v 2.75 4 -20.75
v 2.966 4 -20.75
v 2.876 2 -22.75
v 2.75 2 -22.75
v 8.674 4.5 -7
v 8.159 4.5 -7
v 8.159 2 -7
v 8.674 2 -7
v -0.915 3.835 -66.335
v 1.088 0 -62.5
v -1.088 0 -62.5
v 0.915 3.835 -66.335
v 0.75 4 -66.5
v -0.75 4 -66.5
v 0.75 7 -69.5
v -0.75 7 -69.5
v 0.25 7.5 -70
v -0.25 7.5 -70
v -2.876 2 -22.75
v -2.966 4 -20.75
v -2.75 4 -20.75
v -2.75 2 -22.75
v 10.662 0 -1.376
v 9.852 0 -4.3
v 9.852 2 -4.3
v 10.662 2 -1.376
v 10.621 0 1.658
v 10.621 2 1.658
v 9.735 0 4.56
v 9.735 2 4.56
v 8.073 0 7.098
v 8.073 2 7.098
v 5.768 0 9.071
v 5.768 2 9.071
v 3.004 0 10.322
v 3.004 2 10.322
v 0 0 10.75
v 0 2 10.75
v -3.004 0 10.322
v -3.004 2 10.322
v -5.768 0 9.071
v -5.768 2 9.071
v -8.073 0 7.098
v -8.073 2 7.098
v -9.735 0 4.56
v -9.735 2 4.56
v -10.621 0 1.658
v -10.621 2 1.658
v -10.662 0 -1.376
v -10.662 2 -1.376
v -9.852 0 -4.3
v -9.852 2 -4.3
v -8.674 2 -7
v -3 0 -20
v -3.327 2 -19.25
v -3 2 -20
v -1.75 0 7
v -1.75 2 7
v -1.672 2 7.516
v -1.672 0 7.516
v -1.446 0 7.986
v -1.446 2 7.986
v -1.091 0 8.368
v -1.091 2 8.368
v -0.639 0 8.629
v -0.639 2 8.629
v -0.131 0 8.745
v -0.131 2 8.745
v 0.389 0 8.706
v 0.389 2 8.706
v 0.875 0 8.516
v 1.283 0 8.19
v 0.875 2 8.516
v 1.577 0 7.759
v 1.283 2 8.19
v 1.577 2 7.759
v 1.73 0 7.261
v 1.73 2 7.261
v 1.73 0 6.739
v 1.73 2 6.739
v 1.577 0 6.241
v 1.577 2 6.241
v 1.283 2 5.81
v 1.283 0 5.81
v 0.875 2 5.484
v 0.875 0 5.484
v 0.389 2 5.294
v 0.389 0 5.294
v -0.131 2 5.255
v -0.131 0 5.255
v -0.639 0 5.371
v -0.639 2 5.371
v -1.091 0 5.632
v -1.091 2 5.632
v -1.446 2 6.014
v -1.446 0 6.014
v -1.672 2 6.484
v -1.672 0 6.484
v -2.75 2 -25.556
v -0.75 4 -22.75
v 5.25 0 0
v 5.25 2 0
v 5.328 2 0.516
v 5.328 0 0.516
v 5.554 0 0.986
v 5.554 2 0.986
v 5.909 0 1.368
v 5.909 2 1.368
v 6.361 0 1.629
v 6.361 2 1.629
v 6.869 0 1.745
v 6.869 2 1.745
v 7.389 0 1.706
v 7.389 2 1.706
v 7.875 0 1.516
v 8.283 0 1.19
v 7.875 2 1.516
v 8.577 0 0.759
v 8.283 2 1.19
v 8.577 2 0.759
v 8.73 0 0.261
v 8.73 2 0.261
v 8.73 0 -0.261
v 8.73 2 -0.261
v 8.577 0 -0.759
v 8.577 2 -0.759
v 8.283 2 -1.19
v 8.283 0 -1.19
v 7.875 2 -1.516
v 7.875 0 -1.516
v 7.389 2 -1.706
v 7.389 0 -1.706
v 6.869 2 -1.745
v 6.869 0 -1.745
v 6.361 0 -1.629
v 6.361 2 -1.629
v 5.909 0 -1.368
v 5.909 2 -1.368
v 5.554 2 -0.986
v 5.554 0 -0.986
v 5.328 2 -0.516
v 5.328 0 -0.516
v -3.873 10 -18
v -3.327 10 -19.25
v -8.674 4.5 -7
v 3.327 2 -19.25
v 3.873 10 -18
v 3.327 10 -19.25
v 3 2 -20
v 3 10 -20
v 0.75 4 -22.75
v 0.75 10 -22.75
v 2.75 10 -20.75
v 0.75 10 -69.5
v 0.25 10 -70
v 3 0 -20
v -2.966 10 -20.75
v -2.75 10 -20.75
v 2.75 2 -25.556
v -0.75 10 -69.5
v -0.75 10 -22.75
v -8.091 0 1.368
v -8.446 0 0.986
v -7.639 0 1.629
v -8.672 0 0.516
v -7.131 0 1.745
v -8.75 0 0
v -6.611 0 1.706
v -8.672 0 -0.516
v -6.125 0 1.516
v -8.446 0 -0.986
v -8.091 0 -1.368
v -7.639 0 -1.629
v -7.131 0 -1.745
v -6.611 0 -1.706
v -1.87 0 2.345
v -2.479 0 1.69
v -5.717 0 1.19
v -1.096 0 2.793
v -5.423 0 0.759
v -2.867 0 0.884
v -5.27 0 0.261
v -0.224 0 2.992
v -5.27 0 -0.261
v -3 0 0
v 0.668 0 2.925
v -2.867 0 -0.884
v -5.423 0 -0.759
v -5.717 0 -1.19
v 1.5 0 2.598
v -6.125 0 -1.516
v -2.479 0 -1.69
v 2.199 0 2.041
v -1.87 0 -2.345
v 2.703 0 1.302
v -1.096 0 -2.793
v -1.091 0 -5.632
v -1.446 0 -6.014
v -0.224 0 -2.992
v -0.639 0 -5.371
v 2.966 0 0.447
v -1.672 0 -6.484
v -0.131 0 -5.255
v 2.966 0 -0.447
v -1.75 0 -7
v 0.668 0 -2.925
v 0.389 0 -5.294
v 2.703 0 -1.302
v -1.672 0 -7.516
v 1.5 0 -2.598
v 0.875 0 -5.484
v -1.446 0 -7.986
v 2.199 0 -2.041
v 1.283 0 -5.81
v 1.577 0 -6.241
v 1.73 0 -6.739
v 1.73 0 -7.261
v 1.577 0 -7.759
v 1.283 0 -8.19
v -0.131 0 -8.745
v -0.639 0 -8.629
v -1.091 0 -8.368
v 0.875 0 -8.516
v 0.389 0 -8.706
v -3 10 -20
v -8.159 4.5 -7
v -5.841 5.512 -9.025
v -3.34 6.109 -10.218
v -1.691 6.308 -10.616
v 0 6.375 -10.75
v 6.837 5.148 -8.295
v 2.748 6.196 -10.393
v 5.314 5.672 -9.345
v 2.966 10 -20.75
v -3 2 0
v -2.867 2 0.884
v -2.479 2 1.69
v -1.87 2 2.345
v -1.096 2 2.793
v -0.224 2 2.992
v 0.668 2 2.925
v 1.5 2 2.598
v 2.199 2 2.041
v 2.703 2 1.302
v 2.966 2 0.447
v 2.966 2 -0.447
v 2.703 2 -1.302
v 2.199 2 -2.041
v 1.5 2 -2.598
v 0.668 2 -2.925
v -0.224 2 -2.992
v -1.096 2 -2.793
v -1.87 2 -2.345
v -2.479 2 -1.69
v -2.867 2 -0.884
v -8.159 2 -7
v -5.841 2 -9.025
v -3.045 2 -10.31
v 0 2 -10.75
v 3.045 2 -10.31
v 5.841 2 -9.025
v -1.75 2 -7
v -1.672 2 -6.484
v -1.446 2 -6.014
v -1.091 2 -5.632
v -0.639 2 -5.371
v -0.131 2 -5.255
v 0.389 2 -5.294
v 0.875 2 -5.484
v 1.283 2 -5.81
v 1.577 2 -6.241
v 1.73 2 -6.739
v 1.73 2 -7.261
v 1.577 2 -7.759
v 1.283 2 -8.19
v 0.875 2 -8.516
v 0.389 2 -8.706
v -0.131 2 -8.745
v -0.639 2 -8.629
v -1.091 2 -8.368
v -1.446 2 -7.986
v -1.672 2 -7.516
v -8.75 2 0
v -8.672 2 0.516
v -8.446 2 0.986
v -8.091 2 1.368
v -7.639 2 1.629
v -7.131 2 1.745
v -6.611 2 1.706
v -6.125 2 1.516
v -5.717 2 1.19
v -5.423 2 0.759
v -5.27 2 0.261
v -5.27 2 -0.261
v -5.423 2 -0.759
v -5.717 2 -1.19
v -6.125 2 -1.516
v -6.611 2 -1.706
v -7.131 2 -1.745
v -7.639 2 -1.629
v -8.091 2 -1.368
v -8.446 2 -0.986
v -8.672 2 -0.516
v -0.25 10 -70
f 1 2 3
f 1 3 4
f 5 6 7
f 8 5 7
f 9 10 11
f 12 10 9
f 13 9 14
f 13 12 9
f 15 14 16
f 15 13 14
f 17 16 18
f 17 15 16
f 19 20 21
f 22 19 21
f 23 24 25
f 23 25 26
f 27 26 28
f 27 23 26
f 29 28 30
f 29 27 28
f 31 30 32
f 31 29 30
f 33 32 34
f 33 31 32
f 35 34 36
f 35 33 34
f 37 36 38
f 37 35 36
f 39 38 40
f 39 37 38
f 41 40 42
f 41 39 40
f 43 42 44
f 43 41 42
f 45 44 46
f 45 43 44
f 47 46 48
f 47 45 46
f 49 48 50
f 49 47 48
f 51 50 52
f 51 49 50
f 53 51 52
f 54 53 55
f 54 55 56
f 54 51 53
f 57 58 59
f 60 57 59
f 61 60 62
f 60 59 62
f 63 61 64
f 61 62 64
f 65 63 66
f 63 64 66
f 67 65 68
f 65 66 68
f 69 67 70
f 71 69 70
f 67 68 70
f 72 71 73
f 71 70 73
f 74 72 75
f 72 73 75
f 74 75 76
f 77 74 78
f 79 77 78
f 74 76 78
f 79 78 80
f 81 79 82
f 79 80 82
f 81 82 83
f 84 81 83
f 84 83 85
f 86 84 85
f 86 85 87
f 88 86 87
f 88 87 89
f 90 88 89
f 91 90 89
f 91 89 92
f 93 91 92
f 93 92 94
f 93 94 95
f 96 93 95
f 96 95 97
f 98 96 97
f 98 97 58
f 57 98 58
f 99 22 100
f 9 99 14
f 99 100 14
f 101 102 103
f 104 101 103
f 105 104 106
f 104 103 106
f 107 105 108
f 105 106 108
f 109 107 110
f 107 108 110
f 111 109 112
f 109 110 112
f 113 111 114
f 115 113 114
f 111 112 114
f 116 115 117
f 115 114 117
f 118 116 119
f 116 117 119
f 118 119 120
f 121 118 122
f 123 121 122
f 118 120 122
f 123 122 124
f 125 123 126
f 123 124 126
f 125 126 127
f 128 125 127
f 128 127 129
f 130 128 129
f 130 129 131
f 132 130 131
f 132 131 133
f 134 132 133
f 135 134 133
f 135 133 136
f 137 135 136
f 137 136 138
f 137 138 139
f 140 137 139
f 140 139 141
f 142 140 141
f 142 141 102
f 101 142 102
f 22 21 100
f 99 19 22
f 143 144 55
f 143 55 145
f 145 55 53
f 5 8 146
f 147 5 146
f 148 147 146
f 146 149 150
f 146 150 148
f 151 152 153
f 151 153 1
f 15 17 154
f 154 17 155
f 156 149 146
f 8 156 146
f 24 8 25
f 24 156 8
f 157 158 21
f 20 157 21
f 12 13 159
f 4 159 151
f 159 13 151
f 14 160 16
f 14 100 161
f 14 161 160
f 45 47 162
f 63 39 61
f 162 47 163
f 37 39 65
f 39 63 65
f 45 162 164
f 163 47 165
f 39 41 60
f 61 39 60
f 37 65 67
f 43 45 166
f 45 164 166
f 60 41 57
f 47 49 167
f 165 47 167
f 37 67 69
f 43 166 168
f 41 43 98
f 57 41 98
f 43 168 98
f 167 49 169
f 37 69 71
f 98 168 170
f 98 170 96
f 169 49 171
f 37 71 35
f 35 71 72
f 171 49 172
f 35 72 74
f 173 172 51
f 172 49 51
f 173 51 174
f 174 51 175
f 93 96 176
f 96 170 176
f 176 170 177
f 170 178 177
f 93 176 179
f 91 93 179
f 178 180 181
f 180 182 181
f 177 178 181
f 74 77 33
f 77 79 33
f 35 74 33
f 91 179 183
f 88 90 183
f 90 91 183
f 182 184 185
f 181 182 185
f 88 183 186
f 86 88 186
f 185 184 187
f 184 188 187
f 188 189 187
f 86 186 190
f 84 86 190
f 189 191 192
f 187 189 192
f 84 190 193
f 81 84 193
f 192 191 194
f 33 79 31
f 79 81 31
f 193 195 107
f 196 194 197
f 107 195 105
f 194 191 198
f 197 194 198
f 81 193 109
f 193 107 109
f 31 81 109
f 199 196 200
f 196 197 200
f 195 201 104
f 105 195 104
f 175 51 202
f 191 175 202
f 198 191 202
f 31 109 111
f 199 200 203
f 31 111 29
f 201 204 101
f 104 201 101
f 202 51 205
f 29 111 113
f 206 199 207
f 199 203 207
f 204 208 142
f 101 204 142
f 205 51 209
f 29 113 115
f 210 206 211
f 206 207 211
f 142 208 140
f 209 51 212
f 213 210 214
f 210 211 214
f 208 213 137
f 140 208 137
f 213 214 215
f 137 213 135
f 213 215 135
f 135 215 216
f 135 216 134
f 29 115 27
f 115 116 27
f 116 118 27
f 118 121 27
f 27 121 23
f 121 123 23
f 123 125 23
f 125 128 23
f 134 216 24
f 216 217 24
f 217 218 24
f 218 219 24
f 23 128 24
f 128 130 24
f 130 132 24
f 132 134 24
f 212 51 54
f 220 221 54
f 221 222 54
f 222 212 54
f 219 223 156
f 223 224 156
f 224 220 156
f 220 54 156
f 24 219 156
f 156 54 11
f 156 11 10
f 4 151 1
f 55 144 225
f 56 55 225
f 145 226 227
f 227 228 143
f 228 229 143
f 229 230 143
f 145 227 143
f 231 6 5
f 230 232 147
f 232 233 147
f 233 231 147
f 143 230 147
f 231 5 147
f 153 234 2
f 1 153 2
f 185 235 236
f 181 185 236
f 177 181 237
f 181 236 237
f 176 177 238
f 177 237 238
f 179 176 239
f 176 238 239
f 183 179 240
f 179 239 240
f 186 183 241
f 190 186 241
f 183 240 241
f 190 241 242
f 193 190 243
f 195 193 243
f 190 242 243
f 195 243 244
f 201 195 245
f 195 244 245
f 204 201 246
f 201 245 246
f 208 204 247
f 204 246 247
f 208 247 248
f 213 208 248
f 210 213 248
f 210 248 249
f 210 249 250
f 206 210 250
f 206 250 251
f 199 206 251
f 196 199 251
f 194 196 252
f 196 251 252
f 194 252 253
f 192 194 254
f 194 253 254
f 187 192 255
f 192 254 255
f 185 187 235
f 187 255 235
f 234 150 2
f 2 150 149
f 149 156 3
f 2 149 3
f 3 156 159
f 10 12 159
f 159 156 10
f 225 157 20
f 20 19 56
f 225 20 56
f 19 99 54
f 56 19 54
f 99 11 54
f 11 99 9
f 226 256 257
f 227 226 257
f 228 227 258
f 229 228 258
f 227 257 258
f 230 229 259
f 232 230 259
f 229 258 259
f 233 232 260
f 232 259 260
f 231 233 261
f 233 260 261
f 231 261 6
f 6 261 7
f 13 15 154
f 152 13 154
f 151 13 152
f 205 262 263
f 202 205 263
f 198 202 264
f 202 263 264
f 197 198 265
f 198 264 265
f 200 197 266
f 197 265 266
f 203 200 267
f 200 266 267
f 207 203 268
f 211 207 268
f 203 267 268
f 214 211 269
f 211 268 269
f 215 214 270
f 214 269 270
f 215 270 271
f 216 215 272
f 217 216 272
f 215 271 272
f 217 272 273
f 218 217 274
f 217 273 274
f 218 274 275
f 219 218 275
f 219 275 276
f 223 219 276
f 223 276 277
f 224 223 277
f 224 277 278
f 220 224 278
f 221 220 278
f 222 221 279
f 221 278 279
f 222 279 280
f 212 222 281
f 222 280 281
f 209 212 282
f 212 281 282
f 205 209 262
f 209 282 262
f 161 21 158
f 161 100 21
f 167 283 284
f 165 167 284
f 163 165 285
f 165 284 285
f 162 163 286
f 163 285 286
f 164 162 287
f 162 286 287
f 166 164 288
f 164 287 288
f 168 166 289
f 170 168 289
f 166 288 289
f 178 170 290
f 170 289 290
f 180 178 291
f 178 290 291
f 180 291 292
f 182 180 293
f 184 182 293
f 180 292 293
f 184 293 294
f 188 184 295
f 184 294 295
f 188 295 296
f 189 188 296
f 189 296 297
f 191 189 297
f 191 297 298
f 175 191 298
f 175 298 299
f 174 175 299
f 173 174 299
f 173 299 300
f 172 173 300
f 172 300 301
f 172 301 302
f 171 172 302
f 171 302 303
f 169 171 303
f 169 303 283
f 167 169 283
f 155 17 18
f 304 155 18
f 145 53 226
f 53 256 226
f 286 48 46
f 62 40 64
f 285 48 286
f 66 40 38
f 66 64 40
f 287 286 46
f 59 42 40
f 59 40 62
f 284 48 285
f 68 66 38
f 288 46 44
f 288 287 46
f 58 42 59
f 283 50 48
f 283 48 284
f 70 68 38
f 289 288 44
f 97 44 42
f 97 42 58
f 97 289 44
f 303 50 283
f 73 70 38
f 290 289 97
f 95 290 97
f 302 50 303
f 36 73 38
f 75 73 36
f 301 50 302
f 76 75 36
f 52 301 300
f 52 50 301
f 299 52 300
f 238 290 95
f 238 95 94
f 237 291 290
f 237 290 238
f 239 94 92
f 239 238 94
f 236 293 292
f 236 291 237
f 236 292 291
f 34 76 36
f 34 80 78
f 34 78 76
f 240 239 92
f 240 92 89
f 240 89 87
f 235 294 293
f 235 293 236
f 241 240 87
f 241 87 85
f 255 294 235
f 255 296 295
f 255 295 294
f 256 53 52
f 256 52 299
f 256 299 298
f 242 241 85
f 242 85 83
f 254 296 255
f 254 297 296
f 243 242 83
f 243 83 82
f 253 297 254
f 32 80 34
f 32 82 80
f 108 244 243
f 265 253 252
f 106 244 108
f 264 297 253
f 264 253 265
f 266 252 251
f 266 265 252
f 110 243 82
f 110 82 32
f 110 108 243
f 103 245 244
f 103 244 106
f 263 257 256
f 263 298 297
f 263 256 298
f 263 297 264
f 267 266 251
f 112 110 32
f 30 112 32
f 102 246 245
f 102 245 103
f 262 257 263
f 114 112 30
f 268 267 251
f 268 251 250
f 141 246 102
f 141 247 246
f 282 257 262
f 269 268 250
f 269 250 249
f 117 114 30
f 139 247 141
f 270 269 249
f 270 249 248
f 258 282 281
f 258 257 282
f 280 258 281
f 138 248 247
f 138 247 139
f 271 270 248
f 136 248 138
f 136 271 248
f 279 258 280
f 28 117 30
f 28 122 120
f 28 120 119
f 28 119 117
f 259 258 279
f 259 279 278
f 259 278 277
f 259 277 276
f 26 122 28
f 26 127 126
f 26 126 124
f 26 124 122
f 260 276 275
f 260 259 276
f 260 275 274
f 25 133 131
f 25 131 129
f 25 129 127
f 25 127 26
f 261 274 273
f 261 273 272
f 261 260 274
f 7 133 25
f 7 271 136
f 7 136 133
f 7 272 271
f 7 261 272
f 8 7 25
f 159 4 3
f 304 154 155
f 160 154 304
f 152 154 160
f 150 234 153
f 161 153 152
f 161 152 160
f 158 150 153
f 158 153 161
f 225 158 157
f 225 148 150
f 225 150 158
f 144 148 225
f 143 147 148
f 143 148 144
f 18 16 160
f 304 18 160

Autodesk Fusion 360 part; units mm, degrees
sketch "Sketch1" plane through (0, 0, 0) normal (0, 1, 0) x (1, 0, 0)
  circle A0 centre (0, 0) radius 10.75
  line L0 (-9.8524, 4.3003) -> (-3, 20)
  line L1 (-3, 20) -> (3, 20)
  line L2 (3, 20) -> (9.8524, 4.3003)
  line L3 (0, 0) -> (0, 20) construction
  line L4 (3, 20) -> (0.75, 70)
  line L5 (0.75, 70) -> (-0.75, 70)
  line L6 (-0.75, 70) -> (-3, 20)
  line L7 (0, 20) -> (0, 70) construction
  dimension "d1" = 21.5
  dimension "d6" = 6
  dimension "d7" = 20
  dimension "d8" = 90
  dimension "d14" = 90
  dimension "d15" = 1.5
  dimension "d16" = 70
extrude "Extrude1" add sketch "Sketch1" along normal blind 2
sketch "Sketch2" plane through (0, 2, 0) normal (0, 1, 0) x (-1, 0, 0)
  arc A0 (9.8524, -4.3003) -> (-9.8524, -4.3003) centre (0, 0) ccw
  circle A1 centre (0, 0) radius 7
  line L0 (-9.8524, -4.3003) -> (-3, -20)
  line L1 (3, -20) -> (9.8524, -4.3003)
  line L2 (0, 0) -> (0, -7) construction
  circle A2 centre (0, -7) radius 1.75
  circle A3 centre (7, 0) radius 1.75
  circle A4 centre (0, 7) radius 1.75
  circle A5 centre (-7, 0) radius 1.75
  line L3 (-3, -20) -> (-0.75, -70)
  line L4 (-0.75, -70) -> (0.75, -70)
  line L5 (0.75, -70) -> (3, -20)
  dimension "d5" = 14
  dimension "d9" = 3.5
  dimension "d11" = 360
extrude "Extrude2" cut sketch "Sketch2" against normal up to surface (2 mm away) contours A1 A3 | A1 A3 | A1 A4 | A1 A4 | A1 A2 | A1 A2 | A1 A5 | A1 A5
sketch "Sketch4" plane through (0, 2, 0) normal (0, 1, 0) x (-1, 0, 0)
  circle A0 centre (7, 0) radius 1.75
  circle A1 centre (0, 7) radius 1.75
  circle A2 centre (0, -7) radius 1.75
  circle A3 centre (-7, 0) radius 1.75
  line L0 (-3, -20) -> (-0.75, -70)
  line L1 (-0.75, -70) -> (0.75, -70)
  line L2 (0.75, -70) -> (3, -20)
  line L3 (3, -20) -> (9.8524, -4.3003)
  arc A4 (9.8524, -4.3003) -> (-9.8524, -4.3003) centre (0, 0) ccw
  line L4 (-9.8524, -4.3003) -> (-3, -20)
  circle A5 centre (0, 0) radius 10.75 construction
sketch "Sketch3" plane through (0, 0, 0) normal (1, 0, 0) x (0, 0, -1)
  line L0 (-1.75, 2) -> (1.75, 2)
  line L1 (-8.75, 2) -> (-5.25, 2)
  line L2 (5.25, 2) -> (8.75, 2)
  line L3 (-1.75, 2) -> (1.75, 2)
  line L4 (20, 2) -> (70, 2)
  line L5 (70, 2) -> (20, 2)
  line L6 (20, 2) -> (4.3003, 2)
  line L7 (4.3003, 2) -> (-10.75, 2)
  line L8 (4.3003, 2) -> (20, 2)
  line L9 (10.75, 2) -> (-10.75, 2)
  line L10 (20.75, 2) -> (19.25, 2)
  line L11 (19.25, 2) -> (19.25, 10)
  line L12 (19.25, 10) -> (20.75, 10)
  line L13 (20.75, 10) -> (20.75, 2)
  line L14 (20, 10) -> (20, 2) construction
  dimension "d17" = 1.5
  dimension "d18" = 8
extrude "Extrude3" add sketch "Sketch3" along normal up to surface end surface through (-9.8524, 0, -4.3003) normal (-0.916505, 0, -0.400024) offset 0
mirror "Mirror1" about plane through (0, 0, 0) normal (1, 0, 0) of "Extrude3"
sketch "Sketch5" plane through (0, 2, 0) normal (0, 1, 0) x (-1, 0, 0)
  line L0 (-2.6726, -20.75) -> (-3, -20)
  line L1 (-3, -20) -> (-0.75, -70)
  line L2 (-0.75, -70) -> (0.75, -70)
  line L3 (0.75, -70) -> (3, -20)
  line L4 (3, -20) -> (2.6726, -20.75)
  line L5 (2.6726, -20.75) -> (-2.6726, -20.75)
  line L6 (2.6726, -20.75) -> (3.3274, -19.25)
  line L7 (3.3274, -19.25) -> (-3.3274, -19.25)
  line L8 (-3.3274, -19.25) -> (-2.6726, -20.75)
  line L9 (-2.6726, -20.75) -> (2.6726, -20.75)
  line L10 (2.6726, -20.75) -> (2.9663, -20.75)
  line L11 (-2.6726, -20.75) -> (-2.9663, -20.75)
  line L12 (0.75, -70) -> (-0.75, -70)
  line L13 (-0.75, -70) -> (-0.75, -20.75)
  line L14 (-0.75, -20.75) -> (0.75, -20.75)
  line L15 (0.75, -20.75) -> (0.75, -70)
  circle A0 centre (7, 0) radius 1.75
  circle A1 centre (0, 7) radius 1.75
  circle A2 centre (0, -7) radius 1.75
  circle A3 centre (-7, 0) radius 1.75
  line L16 (-3.3274, -19.25) -> (3.3274, -19.25)
  line L17 (3.3274, -19.25) -> (9.8524, -4.3003)
  arc A4 (9.8524, -4.3003) -> (-9.8524, -4.3003) centre (0, 0) ccw
  line L18 (-9.8524, -4.3003) -> (-3.3274, -19.25)
  circle A5 centre (0, 0) radius 10.75
extrude "Extrude4" add sketch "Sketch5" along normal up to surface (8 mm away) contours L0 L1 L8 L11 | L2 L5 L9 L12 L13 L14 L15 | L7 L16 L17 L18 A5 | L3 L4 L6 L10
sketch "Sketch6" plane through (0, 0, 0) normal (1, 0, 0) x (0, 0, -1)
  line L0 (20, 10) -> (20, 0)
  line L1 (20, 0) -> (4.3003, 0)
  line L2 (4.3003, 0) -> (4.3003, 2)
  line L3 (4.3003, 2) -> (4.3003, 10)
  line L4 (4.3003, 10) -> (20, 10)
  line L5 (70, 0) -> (20, 0)
  line L6 (20, 0) -> (20, 10)
  line L7 (20, 10) -> (20.75, 10)
  line L8 (20.75, 10) -> (20.75, 2)
  line L9 (20.75, 2) -> (70, 2)
  line L10 (70, 2) -> (70, 0)
  line L11 (20.75, 10) -> (70, 10)
  line L12 (70, 10) -> (70, 2)
  line L13 (70, 2) -> (20.75, 2)
  line L14 (20.75, 2) -> (20.75, 10)
  line L15 (4.3003, 0) -> (-10.75, 0)
  line L16 (4.3003, 0) -> (4.3003, 2)
  line L17 (4.3003, 2) -> (-10.75, 2)
  line L18 (4.3003, 2) -> (4.3003, 0)
  line L19 (10.75, 10) -> (4.3003, 10)
  line L20 (4.3003, 10) -> (4.3003, 2)
  line L21 (10.75, 2) -> (4.3003, 2)
  line L22 (4.3003, 2) -> (4.3003, 10)
  line L23 (8.75, 0) -> (5.25, 0)
  line L24 (5.25, 2) -> (8.75, 2)
  line L25 (7, 2) -> (7, 4.5)
  line L26 (7, 4.5) -> (18, 10)
  point P0 (7, 2)
  dimension "d25" = 2.5
  dimension "d26" = 2
extrude "Extrude5" cut sketch "Sketch6" against normal through all contours L3 L4 L19 L20 L21 L22 L24 L25 L26
mirror "Mirror2" about plane through (0, 0, 0) normal (1, 0, 0) of "Extrude5"
sketch "Sketch7" plane through (0, 0, 0) normal (1, 0, 0) x (0, 0, -1)
  line L0 (70, 10) -> (20.75, 10)
  line L1 (20.75, 10) -> (20.75, 2)
  line L2 (20.75, 2) -> (70, 2)
  line L3 (70, 2) -> (70, 10)
  line L4 (20, 0) -> (70, 0)
  line L5 (70, 0) -> (70, 2)
  line L6 (70, 2) -> (20.75, 2)
  line L7 (20.75, 2) -> (20.75, 10)
  line L8 (20.75, 10) -> (20, 10)
  line L9 (20, 10) -> (20, 0)
  line L10 (70, 7.5) -> (62.5, 0)
  dimension "d30" = 2.5
  dimension "d31" = 45
extrude "Extrude6" cut sketch "Sketch7" along normal through all contours L2 L3 L6 L10 | L2 L4 L5 L6 L10
mirror "Mirror3" about plane through (0, 0, 0) normal (1, 0, 0) of "Extrude6"
chamfer "Chamfer1" distance 2 angle 45 6 edges at (0.75, 6, -20.75) (0.75, 2, -42.625) (1.8581, 2, -20.75) (-0.75, 6, -20.75) (-1.8581, 2, -20.75) (-0.75, 2, -42.625)
chamfer "Chamfer2" distance 0.5 angle 45 2 edges at (-0.75, 8.75, -70) (0.75, 8.75, -70)
sketch "Sketch8" plane through (0, 2, 0) normal (0, 1, 0) x (-1, 0, 0)
  circle A0 centre (0, -7) radius 1.75
  arc A1 (-8.1586, -7) -> (8.1586, -7) centre (0, 0) ccw
  line L0 (8.1586, -7) -> (8.6741, -7)
  line L1 (8.6741, -7) -> (9.8524, -4.3003)
  arc A2 (9.8524, -4.3003) -> (-9.8524, -4.3003) centre (0, 0) ccw
  line L2 (-9.8524, -4.3003) -> (-8.6741, -7)
  line L3 (-8.6741, -7) -> (-8.1586, -7)
  circle A3 centre (7, 0) radius 1.75
  circle A4 centre (0, 7) radius 1.75
  circle A5 centre (-7, 0) radius 1.75
  circle A6 centre (0, 0) radius 3
  dimension "d37" = 6
extrude "Extrude7" cut sketch "Sketch8" against normal up to surface (2 mm away) contours A6
equation "d14 = d8"
